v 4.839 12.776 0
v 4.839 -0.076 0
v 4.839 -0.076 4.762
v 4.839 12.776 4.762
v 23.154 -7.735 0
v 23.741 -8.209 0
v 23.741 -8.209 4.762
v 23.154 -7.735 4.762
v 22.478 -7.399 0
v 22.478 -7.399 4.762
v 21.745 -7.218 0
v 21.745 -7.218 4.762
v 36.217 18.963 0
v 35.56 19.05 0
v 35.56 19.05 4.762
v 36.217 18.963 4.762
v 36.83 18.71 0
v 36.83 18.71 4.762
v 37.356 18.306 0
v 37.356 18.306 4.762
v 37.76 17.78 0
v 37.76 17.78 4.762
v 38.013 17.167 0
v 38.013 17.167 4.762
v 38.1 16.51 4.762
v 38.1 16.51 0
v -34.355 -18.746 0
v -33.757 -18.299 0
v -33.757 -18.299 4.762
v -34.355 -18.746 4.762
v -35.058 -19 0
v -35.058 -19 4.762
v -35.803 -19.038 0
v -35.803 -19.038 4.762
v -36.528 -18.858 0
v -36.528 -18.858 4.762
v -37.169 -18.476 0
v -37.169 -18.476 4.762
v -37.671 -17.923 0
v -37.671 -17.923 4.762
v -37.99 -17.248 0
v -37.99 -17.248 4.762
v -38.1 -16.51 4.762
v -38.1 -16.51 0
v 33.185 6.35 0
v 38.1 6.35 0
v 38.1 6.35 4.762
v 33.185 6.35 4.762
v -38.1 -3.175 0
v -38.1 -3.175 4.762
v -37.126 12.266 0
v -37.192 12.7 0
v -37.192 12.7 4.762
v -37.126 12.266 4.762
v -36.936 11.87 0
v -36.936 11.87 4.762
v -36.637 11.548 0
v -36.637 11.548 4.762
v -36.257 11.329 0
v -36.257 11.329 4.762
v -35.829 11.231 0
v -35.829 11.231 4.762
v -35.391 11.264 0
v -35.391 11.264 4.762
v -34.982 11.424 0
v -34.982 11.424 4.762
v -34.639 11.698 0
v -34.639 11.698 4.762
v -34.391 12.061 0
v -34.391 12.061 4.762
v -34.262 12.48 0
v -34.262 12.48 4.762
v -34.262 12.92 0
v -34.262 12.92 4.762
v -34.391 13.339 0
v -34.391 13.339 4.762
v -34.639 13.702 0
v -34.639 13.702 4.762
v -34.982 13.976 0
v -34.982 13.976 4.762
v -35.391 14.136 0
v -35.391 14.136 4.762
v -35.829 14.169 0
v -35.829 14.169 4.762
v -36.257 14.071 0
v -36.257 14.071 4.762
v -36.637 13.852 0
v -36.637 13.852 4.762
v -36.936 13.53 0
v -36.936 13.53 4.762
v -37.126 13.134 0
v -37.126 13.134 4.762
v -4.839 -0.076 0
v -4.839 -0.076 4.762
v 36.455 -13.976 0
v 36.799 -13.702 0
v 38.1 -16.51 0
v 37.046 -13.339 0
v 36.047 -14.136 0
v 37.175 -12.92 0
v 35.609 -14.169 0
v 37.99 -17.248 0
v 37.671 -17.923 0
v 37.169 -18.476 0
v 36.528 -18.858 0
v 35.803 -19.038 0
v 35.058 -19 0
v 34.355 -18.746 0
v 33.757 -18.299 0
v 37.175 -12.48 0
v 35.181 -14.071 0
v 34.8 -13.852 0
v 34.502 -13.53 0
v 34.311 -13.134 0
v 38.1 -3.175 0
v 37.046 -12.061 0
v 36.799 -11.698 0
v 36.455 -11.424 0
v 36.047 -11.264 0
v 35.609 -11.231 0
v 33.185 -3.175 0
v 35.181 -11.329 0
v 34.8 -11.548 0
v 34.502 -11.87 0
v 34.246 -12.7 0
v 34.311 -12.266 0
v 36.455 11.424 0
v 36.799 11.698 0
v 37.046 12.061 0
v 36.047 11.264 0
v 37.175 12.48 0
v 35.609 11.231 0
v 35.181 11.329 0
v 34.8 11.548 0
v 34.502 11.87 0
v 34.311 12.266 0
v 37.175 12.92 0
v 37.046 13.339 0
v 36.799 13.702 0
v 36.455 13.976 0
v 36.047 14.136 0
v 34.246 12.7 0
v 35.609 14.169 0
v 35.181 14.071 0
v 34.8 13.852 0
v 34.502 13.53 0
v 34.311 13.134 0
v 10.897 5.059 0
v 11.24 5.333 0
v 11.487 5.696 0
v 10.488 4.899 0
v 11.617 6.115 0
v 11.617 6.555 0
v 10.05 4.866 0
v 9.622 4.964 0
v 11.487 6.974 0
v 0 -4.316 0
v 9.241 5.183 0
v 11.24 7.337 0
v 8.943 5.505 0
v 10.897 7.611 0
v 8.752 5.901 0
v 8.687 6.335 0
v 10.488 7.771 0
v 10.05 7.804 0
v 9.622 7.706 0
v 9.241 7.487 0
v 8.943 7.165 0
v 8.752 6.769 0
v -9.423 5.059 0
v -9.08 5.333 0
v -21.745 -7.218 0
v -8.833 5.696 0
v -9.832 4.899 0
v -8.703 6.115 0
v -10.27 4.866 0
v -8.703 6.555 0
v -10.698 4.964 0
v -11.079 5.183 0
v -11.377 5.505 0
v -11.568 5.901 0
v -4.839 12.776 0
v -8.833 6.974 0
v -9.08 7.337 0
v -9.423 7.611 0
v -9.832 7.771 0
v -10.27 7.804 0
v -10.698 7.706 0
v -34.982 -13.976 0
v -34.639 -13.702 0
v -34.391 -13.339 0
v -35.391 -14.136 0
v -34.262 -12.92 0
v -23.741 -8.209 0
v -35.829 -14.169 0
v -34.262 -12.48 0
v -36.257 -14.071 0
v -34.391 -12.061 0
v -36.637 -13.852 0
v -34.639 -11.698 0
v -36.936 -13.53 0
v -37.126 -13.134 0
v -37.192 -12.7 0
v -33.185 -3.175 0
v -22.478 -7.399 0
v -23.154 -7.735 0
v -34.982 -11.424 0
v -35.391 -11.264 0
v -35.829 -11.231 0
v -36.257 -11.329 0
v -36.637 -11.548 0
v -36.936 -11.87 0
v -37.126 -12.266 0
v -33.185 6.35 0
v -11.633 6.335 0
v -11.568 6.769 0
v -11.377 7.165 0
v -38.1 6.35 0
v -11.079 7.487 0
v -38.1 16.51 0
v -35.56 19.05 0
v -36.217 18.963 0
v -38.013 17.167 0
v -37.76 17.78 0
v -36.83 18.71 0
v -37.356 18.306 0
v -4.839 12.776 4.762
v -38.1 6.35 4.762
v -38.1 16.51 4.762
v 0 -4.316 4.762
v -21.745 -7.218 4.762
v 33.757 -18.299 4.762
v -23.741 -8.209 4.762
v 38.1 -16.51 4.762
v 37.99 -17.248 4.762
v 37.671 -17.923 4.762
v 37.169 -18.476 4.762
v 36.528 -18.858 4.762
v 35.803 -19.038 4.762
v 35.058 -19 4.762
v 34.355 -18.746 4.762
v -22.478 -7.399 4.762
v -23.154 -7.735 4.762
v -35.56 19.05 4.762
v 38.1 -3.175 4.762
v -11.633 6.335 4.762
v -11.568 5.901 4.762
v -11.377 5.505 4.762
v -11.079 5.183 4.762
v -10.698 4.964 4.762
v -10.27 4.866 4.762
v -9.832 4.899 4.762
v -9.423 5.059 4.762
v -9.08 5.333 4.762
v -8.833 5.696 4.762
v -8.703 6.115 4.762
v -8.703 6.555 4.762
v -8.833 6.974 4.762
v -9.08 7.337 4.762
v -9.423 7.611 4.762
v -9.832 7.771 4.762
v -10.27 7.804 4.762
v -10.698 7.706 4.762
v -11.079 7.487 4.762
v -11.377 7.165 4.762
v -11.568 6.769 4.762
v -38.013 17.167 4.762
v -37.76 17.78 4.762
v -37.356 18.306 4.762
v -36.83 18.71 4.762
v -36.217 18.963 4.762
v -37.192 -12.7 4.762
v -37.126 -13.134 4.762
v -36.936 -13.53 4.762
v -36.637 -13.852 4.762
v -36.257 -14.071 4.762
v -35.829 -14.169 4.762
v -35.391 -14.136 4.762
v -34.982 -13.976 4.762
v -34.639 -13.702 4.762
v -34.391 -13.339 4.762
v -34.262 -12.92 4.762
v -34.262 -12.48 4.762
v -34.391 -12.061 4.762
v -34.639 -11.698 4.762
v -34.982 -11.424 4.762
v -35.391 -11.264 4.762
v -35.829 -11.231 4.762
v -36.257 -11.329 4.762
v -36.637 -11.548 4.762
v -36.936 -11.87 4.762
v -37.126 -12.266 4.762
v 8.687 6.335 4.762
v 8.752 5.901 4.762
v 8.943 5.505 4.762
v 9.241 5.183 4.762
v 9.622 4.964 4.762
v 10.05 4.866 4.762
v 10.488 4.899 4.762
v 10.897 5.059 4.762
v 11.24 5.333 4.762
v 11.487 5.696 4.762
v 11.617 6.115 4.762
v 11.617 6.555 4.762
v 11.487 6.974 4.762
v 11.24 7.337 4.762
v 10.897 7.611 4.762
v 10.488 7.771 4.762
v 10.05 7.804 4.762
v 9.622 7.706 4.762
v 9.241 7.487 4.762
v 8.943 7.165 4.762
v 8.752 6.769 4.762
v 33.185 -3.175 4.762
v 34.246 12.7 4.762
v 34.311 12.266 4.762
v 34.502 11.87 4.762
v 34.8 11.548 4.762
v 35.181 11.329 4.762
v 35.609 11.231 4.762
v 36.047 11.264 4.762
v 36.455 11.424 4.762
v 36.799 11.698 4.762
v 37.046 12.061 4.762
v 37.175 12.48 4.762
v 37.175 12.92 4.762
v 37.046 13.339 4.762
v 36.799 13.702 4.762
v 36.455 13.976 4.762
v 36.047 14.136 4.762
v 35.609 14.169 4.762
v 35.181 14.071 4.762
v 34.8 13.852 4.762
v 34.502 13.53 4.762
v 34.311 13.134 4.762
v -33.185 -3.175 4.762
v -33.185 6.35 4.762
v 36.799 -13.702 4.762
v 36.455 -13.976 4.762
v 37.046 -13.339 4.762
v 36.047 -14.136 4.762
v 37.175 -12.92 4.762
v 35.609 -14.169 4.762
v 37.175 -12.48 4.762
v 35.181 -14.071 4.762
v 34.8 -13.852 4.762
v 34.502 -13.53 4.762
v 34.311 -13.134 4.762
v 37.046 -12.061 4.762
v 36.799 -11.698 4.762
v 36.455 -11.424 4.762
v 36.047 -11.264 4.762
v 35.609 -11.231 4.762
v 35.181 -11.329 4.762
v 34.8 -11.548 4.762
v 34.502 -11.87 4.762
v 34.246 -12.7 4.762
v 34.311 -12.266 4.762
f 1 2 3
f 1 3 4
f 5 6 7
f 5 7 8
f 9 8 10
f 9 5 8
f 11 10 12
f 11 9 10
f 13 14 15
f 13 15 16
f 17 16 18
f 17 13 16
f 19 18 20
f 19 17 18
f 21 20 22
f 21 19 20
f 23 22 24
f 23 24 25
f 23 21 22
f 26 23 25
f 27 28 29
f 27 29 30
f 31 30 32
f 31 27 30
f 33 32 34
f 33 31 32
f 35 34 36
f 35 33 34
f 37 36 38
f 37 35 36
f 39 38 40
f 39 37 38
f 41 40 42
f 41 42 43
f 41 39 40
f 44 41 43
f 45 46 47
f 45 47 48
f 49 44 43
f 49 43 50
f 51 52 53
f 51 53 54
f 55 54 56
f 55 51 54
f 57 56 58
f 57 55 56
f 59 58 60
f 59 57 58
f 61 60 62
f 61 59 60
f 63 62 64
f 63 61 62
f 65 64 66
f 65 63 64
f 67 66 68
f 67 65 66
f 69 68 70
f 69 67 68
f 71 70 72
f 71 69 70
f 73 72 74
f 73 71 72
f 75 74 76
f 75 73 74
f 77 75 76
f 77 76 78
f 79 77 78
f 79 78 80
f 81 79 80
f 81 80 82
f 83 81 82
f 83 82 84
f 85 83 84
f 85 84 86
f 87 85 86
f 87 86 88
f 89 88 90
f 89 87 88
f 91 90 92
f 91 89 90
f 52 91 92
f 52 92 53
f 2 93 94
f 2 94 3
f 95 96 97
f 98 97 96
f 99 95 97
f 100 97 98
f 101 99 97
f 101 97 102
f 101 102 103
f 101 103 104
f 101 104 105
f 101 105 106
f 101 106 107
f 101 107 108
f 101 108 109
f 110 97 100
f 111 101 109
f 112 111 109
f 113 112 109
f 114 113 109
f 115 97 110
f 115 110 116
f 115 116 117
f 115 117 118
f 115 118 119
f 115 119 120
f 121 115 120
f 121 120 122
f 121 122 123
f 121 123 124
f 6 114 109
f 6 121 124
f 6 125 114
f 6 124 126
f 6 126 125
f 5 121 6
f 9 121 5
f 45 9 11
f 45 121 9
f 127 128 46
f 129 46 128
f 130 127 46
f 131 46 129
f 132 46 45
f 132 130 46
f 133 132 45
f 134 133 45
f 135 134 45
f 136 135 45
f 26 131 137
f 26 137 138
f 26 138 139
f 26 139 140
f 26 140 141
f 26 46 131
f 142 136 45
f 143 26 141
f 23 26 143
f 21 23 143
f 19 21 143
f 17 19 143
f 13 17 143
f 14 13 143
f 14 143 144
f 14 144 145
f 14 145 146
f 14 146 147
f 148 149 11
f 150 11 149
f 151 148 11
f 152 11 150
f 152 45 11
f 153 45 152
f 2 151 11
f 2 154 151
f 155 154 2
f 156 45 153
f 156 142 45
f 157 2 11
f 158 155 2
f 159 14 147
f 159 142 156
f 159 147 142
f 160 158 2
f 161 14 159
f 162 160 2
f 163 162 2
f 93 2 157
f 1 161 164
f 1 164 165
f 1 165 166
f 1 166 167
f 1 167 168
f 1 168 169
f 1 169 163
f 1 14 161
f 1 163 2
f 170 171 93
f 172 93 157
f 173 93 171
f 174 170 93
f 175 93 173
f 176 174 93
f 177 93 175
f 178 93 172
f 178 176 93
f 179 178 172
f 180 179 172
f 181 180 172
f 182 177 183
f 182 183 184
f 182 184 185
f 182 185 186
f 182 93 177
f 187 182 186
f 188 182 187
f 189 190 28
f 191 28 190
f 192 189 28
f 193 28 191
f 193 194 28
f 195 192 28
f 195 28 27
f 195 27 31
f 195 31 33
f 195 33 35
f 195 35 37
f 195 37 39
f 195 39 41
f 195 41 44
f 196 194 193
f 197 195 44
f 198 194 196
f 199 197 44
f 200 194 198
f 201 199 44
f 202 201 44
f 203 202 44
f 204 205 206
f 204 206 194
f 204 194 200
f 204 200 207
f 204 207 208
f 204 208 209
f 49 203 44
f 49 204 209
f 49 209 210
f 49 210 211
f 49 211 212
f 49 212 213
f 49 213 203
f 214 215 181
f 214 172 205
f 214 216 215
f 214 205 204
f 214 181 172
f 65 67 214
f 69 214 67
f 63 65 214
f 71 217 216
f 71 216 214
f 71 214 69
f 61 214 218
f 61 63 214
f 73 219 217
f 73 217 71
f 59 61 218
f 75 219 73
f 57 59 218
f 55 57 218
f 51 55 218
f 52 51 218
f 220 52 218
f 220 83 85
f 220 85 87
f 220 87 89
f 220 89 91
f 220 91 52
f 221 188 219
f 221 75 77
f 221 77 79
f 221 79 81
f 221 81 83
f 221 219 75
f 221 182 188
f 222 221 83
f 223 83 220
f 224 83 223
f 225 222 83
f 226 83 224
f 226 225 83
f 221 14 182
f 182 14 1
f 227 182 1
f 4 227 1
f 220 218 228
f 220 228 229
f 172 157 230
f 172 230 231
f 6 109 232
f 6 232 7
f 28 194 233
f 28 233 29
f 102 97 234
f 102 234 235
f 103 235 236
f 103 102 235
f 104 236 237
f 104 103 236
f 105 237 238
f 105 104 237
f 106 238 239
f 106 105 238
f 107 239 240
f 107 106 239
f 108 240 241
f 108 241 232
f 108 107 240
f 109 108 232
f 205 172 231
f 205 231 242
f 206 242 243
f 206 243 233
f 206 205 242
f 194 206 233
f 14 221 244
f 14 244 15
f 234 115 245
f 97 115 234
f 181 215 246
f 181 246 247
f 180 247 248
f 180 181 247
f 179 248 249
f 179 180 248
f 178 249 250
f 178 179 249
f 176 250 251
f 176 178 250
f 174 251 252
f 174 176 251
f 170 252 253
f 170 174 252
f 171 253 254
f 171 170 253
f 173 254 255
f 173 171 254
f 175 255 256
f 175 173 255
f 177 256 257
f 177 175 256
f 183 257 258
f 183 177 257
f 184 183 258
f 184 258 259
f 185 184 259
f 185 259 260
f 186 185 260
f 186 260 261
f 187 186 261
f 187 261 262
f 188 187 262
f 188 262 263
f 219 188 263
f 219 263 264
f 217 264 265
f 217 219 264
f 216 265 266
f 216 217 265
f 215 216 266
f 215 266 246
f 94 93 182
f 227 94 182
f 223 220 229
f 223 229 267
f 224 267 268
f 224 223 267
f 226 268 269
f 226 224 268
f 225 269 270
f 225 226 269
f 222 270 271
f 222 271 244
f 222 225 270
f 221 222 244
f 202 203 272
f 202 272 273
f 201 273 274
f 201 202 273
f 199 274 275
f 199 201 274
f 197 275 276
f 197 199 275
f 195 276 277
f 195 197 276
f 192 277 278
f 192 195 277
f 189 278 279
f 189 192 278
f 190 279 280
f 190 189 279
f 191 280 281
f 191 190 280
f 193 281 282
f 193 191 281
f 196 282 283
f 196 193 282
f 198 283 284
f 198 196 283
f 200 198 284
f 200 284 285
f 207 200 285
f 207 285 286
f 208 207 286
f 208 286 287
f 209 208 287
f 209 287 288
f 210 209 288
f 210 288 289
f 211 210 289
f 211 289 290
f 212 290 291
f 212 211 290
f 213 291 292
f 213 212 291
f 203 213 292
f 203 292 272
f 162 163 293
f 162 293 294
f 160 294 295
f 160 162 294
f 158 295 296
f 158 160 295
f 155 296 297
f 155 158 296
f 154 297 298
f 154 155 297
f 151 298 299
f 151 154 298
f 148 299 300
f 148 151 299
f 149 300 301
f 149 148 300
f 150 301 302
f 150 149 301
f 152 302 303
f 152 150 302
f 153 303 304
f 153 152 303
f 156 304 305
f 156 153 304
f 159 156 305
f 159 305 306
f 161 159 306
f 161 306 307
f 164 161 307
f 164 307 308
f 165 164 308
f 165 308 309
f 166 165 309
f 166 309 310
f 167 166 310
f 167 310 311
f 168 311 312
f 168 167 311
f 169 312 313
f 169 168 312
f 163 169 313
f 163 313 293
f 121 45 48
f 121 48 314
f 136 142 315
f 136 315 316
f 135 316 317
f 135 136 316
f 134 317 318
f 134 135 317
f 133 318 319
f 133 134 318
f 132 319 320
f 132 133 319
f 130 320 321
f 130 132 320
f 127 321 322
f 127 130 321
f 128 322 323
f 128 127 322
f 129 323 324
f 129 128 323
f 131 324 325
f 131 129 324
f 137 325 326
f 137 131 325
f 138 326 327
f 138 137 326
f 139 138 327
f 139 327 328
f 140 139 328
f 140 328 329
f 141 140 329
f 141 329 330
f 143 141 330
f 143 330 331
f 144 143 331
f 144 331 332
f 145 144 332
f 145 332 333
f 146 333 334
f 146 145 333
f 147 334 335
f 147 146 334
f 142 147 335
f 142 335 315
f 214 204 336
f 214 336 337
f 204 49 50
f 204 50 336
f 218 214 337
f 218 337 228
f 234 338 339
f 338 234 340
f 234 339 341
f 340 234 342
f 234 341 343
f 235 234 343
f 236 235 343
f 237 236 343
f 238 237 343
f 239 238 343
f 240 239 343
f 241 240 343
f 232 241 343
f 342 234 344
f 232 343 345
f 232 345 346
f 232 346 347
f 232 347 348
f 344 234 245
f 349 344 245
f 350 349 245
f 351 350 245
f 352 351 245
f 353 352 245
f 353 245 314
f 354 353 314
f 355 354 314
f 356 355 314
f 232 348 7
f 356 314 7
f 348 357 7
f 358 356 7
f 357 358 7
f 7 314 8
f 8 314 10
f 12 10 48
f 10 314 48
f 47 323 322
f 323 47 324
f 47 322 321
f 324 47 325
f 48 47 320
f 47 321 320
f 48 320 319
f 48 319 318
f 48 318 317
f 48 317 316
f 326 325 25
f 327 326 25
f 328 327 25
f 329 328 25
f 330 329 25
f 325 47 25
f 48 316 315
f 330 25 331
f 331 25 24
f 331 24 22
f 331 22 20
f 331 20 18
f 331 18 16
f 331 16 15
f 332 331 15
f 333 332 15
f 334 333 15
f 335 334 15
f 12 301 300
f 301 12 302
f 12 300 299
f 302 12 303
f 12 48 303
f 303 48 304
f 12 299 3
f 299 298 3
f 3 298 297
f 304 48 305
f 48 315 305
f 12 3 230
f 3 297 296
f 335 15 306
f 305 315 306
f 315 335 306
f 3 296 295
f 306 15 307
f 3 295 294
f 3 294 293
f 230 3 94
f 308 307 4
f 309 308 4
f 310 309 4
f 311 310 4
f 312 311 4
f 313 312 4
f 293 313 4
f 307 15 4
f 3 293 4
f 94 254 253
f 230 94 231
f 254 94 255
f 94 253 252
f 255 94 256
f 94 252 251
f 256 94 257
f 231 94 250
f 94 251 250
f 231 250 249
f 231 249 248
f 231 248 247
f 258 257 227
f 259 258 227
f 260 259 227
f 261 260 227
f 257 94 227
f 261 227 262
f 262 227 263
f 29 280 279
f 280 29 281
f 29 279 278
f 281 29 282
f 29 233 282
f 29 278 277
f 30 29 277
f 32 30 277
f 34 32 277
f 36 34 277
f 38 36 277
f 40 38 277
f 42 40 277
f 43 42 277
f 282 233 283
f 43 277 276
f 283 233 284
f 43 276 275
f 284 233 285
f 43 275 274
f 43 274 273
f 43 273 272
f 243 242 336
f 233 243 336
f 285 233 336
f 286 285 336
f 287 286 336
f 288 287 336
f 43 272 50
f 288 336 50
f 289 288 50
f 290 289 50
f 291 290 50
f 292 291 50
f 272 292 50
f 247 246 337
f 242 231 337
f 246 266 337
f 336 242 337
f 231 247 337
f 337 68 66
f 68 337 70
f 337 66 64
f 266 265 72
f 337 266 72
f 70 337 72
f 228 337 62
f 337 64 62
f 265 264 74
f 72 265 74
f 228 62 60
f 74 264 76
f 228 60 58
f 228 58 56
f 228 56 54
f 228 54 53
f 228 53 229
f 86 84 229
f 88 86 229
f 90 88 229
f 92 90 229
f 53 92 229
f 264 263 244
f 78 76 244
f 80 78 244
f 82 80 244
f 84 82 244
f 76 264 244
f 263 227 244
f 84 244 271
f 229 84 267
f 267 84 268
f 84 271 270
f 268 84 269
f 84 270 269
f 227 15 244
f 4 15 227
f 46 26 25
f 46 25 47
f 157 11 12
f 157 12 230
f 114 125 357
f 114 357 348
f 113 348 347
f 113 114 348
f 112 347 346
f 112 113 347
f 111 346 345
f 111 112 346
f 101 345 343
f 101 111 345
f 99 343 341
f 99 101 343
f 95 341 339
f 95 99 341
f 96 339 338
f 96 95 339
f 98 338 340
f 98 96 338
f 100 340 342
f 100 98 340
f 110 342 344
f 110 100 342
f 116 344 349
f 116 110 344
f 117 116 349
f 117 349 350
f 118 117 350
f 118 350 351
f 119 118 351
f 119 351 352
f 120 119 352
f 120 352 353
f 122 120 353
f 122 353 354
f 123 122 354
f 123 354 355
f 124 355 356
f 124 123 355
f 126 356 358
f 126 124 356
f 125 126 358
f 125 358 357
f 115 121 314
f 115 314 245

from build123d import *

# Parameters (mm, degrees)
SKETCH2_R           = 1.4732
SKETCH2_W           = 9.6774
SKETCH2_H           = 12.8524
BOSS_EXTRUDE1_DEPTH = 4.7625


with BuildPart() as part:
    # Sketch2 → Boss-Extrude1 (new body)
    with BuildSketch(Plane.XY):
        with BuildLine():
            Line((-38.1, -16.51), (-38.1, -3.175))
            Line((-38.1, -3.175), (-33.1851, -3.175))
            Line((-33.1851, -3.175), (-33.1851, 6.35))
            Line((-33.1851, 6.35), (-38.1, 6.35))
            Line((-38.1, 6.35), (-38.1, 16.51))
            ThreePointArc((-38.1, 16.51), (-37.356051224, 18.306051224), (-35.56, 19.05))
            Line((-35.56, 19.05), (35.56, 19.05))
            ThreePointArc((35.56, 19.05), (37.356051224, 18.306051224), (38.1, 16.51))
            Line((38.1, 16.51), (38.1, 6.35))
            Line((38.1, 6.35), (33.1851, 6.35))
            Line((33.1851, 6.35), (33.1851, -3.175))
            Line((33.1851, -3.175), (38.1, -3.175))
            Line((38.1, -3.175), (38.1, -16.51))
            ThreePointArc((38.1, -16.51), (36.527699334, -18.858437353), (33.757355906, -18.299434064))
            Line((33.757355906, -18.299434064), (23.740904814, -8.209039139))
            ThreePointArc((23.740904814, -8.209039139), (22.825089709, -7.548328204), (21.745183011, -7.218089243))
            Line((21.745183011, -7.218089243), (0, -4.31608303))
            Line((0, -4.31608303), (-21.745183011, -7.218089243))
            ThreePointArc((-21.745183011, -7.218089243), (-22.825089709, -7.548328204), (-23.740904814, -8.209039139))
            Line((-23.740904814, -8.209039139), (-33.757355906, -18.299434064))
            ThreePointArc((-33.757355906, -18.299434064), (-36.527699334, -18.858437353), (-38.1, -16.51))
        make_face()
        with Locations(Location((-35.71875, 12.7, 0), (0, 0, 180))):
            Circle(SKETCH2_R, mode=Mode.SUBTRACT)
        with Locations(Location((-35.71875, -12.7, 0), (0, 0, 180))):
            Circle(SKETCH2_R, mode=Mode.SUBTRACT)
        with Locations(Location((35.71875, -12.7, 0), (0, 0, 180))):
            Circle(SKETCH2_R, mode=Mode.SUBTRACT)
        with Locations(Location((35.71875, 12.7, 0), (0, 0, 180))):
            Circle(SKETCH2_R, mode=Mode.SUBTRACT)
        with Locations(Location((-10.16, 6.335014615, 0), (0, 0, 180))):
            Circle(SKETCH2_R, mode=Mode.SUBTRACT)
        with Locations(Location((10.16, 6.335014615, 0), (0, 0, 180))):
            Circle(SKETCH2_R, mode=Mode.SUBTRACT)
        with Locations((0, 6.35)):
            Rectangle(SKETCH2_W, SKETCH2_H, mode=Mode.SUBTRACT)
    extrude(amount=BOSS_EXTRUDE1_DEPTH)


solid = part.part
